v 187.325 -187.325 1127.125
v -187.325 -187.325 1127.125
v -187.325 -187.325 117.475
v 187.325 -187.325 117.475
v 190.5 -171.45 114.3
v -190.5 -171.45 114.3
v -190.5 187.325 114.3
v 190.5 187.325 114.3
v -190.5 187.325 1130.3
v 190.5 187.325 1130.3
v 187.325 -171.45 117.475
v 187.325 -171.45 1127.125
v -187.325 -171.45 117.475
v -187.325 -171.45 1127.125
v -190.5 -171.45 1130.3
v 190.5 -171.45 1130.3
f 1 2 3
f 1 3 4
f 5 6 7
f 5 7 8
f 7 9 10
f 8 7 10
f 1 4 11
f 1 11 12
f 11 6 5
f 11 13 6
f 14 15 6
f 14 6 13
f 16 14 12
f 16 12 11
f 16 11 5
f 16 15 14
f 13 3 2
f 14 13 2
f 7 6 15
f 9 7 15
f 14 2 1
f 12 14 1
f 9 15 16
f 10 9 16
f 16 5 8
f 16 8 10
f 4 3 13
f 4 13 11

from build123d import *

# Parameters (mm, degrees)
F0_W     = 381
F0_H     = 1016
F1_DEPTH = 187.325
F2_W     = 381
F2_H     = 1016
F2_W_2   = 374.65
F2_H_2   = 1009.65
F3_DEPTH = 15.875


with BuildPart() as f1:
    # F0 (on Front) → F1 (new body, symmetric)
    with BuildSketch(Plane.XZ):
        with Locations((0, 622.3)):
            Rectangle(F0_W, F0_H)
    extrude(amount=F1_DEPTH, both=True)

    # F2 (on face) → F3 (cut)
    with BuildSketch(Plane.XZ.offset(187.325)):
        with Locations((0, 622.3)):
            Rectangle(F2_W, F2_H)
        with Locations((0, 622.3)):
            Rectangle(F2_W_2, F2_H_2, mode=Mode.SUBTRACT)
    extrude(amount=-F3_DEPTH, mode=Mode.SUBTRACT)


solid = f1.part
